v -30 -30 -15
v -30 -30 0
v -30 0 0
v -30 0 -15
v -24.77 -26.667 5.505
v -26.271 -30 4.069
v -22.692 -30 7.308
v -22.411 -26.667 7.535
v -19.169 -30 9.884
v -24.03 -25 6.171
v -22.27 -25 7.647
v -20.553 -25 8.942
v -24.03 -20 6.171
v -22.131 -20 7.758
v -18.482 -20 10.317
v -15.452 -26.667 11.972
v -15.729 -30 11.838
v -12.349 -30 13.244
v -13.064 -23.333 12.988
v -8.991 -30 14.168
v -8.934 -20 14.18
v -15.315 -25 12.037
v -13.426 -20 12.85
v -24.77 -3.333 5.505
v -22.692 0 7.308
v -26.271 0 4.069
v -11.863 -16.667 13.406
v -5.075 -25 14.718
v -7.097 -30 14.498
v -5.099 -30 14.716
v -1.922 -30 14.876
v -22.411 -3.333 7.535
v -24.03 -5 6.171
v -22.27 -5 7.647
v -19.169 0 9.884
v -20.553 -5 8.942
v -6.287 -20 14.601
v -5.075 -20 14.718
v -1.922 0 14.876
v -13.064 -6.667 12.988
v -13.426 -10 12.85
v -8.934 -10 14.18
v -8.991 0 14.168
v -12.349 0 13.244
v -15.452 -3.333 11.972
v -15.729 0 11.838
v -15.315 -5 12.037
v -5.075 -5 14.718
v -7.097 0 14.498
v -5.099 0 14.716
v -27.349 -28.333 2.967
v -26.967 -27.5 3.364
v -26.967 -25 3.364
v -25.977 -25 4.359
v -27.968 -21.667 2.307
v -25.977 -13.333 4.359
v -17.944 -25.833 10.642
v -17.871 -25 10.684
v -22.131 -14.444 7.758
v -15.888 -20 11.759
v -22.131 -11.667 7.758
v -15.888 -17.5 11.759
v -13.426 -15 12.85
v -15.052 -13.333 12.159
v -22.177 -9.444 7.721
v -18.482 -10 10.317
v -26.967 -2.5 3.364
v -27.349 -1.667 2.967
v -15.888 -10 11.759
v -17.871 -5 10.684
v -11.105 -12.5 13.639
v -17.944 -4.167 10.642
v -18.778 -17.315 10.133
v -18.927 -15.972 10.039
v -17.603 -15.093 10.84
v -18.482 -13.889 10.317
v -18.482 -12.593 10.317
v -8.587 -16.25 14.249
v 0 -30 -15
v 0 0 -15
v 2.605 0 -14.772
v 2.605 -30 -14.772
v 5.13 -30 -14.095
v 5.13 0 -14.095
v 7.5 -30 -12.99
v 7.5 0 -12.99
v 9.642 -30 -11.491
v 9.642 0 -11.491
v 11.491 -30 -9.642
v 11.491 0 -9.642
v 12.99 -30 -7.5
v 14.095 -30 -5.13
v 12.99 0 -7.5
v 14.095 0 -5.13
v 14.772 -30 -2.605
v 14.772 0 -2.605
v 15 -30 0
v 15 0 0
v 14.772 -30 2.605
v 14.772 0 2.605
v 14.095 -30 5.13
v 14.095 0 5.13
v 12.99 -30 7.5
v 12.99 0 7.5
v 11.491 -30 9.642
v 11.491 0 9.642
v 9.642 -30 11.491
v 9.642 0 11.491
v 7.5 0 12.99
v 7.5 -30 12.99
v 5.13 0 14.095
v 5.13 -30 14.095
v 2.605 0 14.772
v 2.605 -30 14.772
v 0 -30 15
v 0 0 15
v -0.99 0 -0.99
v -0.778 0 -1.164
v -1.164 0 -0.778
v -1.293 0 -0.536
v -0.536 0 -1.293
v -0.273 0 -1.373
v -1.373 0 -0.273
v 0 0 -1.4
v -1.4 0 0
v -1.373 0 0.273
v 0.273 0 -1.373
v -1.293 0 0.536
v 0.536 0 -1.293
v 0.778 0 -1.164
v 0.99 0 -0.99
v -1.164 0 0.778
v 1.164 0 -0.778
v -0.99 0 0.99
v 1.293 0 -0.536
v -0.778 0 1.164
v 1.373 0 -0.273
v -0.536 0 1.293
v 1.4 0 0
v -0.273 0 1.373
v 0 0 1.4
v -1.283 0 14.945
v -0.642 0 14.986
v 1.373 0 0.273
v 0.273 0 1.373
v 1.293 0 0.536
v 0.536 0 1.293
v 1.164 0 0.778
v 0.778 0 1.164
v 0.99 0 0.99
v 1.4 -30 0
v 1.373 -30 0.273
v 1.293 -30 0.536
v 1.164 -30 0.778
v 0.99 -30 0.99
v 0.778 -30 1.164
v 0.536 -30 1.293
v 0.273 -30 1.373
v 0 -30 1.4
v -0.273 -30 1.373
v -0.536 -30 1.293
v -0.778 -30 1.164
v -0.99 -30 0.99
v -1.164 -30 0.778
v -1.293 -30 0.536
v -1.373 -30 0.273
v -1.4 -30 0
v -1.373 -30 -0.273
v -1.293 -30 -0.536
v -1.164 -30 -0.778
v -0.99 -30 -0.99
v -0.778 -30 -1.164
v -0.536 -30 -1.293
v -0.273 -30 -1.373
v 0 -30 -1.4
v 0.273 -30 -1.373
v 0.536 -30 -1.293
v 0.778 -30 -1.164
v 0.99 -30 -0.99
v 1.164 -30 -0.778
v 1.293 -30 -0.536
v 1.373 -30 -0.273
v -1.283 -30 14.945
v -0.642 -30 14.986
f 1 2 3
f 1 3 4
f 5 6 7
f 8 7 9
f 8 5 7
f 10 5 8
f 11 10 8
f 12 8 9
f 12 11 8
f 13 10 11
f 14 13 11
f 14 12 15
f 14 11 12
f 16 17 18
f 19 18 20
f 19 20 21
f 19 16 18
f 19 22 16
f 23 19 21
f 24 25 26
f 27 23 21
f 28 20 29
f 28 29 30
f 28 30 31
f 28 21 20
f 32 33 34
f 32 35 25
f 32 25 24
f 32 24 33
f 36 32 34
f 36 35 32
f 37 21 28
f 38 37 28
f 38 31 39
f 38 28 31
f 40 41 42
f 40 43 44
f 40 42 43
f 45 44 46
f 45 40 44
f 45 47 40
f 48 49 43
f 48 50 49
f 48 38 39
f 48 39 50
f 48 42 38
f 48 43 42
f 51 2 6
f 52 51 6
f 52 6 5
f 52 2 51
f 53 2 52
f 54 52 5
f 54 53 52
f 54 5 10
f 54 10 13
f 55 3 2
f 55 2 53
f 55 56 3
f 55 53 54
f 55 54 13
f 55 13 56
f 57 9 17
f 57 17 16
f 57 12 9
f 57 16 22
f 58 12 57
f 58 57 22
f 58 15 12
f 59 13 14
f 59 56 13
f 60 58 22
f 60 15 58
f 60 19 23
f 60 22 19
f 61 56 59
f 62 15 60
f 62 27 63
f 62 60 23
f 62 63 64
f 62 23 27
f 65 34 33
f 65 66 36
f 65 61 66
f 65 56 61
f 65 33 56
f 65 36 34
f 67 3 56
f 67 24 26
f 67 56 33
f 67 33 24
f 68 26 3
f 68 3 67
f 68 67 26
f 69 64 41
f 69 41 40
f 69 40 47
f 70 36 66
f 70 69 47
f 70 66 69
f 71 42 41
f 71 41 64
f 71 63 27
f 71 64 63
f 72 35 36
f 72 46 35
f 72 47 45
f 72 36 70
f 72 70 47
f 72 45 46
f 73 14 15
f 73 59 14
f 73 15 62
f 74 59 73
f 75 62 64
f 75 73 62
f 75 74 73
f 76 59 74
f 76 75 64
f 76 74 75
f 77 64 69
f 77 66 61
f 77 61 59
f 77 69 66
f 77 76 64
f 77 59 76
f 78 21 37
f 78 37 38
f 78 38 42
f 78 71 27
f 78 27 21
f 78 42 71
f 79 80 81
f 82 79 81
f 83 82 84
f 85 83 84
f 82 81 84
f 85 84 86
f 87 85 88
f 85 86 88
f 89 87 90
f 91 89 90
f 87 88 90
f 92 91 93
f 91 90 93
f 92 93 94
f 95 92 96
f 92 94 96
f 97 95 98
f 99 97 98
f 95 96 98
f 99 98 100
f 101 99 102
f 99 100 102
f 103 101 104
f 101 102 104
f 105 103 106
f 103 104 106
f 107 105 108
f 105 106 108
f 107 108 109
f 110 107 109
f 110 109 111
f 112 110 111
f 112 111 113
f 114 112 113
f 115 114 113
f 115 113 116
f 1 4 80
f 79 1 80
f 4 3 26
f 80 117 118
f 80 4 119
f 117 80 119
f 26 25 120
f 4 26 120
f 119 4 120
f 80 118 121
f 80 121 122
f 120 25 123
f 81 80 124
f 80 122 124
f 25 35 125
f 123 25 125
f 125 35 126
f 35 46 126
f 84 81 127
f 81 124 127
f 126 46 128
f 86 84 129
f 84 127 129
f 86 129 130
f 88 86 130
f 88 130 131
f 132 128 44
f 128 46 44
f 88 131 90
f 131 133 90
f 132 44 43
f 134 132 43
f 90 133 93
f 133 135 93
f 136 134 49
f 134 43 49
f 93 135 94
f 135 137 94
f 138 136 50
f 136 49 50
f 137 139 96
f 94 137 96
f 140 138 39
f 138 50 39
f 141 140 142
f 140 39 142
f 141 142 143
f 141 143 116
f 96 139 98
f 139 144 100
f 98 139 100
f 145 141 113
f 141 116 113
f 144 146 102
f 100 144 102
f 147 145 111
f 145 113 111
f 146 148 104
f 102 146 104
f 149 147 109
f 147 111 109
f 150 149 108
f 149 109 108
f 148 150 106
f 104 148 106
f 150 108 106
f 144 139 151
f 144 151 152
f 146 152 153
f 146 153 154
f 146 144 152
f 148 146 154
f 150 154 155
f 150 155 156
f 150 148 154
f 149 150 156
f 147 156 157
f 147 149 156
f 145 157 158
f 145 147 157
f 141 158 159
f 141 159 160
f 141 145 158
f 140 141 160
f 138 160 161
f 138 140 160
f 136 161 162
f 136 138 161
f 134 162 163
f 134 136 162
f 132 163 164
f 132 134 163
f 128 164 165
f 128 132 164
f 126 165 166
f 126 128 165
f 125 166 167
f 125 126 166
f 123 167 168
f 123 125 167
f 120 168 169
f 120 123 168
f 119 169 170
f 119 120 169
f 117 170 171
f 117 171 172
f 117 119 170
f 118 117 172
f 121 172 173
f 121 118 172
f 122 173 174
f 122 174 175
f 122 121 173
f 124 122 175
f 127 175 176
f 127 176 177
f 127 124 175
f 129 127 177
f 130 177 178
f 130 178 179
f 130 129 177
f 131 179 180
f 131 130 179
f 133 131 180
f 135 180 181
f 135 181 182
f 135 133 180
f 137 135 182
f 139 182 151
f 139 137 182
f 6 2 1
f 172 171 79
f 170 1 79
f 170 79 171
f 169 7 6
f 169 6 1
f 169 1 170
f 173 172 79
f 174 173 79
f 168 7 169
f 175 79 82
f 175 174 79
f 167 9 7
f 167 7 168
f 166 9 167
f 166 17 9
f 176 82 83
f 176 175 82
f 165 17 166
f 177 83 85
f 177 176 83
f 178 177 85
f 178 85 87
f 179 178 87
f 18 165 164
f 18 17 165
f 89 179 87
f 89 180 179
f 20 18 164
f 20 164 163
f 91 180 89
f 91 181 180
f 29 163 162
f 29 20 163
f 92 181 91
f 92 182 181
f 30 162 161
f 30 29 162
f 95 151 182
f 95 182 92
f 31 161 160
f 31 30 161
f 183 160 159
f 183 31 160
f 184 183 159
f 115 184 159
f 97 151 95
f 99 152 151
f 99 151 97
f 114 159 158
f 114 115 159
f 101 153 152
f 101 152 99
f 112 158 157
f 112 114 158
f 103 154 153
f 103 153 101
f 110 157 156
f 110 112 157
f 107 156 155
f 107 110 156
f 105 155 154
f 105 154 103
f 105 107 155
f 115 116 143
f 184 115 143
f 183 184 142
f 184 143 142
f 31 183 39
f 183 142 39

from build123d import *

# Parameters (mm, degrees)
F0_R     = 1.4
F1_DEPTH = 30


with BuildPart() as f1:
    # F0 (on Front) → F1 (new body)
    with BuildSketch(Plane.XZ):
        with BuildLine():
            Line((-30, -15), (0, -15))
            ThreePointArc((0, -15), (15, 0), (0, 15))
            add(Edge.make_bspline(
                [(-1.921847, 14.876374), (-1.200945, 14.903675), (-0.55847, 14.934098), (0, 15)],
                knots=[29.687873, 29.687873, 29.687873, 29.687873, 33.54102, 33.54102, 33.54102, 33.54102], degree=3))
            add(Edge.make_bspline(
                [(-30, 0), (-17.686429, 14.640932), (-7.476277, 14.666022), (-1.921847, 14.876374)],
                knots=[0, 0, 0, 0, 29.687873, 29.687873, 29.687873, 29.687873], degree=3))
            Line((-30, 0), (-30, -15))
        make_face()
        Circle(F0_R, mode=Mode.SUBTRACT)
        with BuildLine():
            add(Edge.make_bspline(
                [(-1.921847, 14.876374), (-1.200945, 14.903675), (-0.55847, 14.934098), (0, 15)],
                knots=[29.687873, 29.687873, 29.687873, 29.687873, 33.54102, 33.54102, 33.54102, 33.54102], degree=3))
            ThreePointArc((0, 15), (-0.962909, 14.969062), (-1.921847, 14.876374))
        make_face()
    extrude(amount=F1_DEPTH)


solid = f1.part
